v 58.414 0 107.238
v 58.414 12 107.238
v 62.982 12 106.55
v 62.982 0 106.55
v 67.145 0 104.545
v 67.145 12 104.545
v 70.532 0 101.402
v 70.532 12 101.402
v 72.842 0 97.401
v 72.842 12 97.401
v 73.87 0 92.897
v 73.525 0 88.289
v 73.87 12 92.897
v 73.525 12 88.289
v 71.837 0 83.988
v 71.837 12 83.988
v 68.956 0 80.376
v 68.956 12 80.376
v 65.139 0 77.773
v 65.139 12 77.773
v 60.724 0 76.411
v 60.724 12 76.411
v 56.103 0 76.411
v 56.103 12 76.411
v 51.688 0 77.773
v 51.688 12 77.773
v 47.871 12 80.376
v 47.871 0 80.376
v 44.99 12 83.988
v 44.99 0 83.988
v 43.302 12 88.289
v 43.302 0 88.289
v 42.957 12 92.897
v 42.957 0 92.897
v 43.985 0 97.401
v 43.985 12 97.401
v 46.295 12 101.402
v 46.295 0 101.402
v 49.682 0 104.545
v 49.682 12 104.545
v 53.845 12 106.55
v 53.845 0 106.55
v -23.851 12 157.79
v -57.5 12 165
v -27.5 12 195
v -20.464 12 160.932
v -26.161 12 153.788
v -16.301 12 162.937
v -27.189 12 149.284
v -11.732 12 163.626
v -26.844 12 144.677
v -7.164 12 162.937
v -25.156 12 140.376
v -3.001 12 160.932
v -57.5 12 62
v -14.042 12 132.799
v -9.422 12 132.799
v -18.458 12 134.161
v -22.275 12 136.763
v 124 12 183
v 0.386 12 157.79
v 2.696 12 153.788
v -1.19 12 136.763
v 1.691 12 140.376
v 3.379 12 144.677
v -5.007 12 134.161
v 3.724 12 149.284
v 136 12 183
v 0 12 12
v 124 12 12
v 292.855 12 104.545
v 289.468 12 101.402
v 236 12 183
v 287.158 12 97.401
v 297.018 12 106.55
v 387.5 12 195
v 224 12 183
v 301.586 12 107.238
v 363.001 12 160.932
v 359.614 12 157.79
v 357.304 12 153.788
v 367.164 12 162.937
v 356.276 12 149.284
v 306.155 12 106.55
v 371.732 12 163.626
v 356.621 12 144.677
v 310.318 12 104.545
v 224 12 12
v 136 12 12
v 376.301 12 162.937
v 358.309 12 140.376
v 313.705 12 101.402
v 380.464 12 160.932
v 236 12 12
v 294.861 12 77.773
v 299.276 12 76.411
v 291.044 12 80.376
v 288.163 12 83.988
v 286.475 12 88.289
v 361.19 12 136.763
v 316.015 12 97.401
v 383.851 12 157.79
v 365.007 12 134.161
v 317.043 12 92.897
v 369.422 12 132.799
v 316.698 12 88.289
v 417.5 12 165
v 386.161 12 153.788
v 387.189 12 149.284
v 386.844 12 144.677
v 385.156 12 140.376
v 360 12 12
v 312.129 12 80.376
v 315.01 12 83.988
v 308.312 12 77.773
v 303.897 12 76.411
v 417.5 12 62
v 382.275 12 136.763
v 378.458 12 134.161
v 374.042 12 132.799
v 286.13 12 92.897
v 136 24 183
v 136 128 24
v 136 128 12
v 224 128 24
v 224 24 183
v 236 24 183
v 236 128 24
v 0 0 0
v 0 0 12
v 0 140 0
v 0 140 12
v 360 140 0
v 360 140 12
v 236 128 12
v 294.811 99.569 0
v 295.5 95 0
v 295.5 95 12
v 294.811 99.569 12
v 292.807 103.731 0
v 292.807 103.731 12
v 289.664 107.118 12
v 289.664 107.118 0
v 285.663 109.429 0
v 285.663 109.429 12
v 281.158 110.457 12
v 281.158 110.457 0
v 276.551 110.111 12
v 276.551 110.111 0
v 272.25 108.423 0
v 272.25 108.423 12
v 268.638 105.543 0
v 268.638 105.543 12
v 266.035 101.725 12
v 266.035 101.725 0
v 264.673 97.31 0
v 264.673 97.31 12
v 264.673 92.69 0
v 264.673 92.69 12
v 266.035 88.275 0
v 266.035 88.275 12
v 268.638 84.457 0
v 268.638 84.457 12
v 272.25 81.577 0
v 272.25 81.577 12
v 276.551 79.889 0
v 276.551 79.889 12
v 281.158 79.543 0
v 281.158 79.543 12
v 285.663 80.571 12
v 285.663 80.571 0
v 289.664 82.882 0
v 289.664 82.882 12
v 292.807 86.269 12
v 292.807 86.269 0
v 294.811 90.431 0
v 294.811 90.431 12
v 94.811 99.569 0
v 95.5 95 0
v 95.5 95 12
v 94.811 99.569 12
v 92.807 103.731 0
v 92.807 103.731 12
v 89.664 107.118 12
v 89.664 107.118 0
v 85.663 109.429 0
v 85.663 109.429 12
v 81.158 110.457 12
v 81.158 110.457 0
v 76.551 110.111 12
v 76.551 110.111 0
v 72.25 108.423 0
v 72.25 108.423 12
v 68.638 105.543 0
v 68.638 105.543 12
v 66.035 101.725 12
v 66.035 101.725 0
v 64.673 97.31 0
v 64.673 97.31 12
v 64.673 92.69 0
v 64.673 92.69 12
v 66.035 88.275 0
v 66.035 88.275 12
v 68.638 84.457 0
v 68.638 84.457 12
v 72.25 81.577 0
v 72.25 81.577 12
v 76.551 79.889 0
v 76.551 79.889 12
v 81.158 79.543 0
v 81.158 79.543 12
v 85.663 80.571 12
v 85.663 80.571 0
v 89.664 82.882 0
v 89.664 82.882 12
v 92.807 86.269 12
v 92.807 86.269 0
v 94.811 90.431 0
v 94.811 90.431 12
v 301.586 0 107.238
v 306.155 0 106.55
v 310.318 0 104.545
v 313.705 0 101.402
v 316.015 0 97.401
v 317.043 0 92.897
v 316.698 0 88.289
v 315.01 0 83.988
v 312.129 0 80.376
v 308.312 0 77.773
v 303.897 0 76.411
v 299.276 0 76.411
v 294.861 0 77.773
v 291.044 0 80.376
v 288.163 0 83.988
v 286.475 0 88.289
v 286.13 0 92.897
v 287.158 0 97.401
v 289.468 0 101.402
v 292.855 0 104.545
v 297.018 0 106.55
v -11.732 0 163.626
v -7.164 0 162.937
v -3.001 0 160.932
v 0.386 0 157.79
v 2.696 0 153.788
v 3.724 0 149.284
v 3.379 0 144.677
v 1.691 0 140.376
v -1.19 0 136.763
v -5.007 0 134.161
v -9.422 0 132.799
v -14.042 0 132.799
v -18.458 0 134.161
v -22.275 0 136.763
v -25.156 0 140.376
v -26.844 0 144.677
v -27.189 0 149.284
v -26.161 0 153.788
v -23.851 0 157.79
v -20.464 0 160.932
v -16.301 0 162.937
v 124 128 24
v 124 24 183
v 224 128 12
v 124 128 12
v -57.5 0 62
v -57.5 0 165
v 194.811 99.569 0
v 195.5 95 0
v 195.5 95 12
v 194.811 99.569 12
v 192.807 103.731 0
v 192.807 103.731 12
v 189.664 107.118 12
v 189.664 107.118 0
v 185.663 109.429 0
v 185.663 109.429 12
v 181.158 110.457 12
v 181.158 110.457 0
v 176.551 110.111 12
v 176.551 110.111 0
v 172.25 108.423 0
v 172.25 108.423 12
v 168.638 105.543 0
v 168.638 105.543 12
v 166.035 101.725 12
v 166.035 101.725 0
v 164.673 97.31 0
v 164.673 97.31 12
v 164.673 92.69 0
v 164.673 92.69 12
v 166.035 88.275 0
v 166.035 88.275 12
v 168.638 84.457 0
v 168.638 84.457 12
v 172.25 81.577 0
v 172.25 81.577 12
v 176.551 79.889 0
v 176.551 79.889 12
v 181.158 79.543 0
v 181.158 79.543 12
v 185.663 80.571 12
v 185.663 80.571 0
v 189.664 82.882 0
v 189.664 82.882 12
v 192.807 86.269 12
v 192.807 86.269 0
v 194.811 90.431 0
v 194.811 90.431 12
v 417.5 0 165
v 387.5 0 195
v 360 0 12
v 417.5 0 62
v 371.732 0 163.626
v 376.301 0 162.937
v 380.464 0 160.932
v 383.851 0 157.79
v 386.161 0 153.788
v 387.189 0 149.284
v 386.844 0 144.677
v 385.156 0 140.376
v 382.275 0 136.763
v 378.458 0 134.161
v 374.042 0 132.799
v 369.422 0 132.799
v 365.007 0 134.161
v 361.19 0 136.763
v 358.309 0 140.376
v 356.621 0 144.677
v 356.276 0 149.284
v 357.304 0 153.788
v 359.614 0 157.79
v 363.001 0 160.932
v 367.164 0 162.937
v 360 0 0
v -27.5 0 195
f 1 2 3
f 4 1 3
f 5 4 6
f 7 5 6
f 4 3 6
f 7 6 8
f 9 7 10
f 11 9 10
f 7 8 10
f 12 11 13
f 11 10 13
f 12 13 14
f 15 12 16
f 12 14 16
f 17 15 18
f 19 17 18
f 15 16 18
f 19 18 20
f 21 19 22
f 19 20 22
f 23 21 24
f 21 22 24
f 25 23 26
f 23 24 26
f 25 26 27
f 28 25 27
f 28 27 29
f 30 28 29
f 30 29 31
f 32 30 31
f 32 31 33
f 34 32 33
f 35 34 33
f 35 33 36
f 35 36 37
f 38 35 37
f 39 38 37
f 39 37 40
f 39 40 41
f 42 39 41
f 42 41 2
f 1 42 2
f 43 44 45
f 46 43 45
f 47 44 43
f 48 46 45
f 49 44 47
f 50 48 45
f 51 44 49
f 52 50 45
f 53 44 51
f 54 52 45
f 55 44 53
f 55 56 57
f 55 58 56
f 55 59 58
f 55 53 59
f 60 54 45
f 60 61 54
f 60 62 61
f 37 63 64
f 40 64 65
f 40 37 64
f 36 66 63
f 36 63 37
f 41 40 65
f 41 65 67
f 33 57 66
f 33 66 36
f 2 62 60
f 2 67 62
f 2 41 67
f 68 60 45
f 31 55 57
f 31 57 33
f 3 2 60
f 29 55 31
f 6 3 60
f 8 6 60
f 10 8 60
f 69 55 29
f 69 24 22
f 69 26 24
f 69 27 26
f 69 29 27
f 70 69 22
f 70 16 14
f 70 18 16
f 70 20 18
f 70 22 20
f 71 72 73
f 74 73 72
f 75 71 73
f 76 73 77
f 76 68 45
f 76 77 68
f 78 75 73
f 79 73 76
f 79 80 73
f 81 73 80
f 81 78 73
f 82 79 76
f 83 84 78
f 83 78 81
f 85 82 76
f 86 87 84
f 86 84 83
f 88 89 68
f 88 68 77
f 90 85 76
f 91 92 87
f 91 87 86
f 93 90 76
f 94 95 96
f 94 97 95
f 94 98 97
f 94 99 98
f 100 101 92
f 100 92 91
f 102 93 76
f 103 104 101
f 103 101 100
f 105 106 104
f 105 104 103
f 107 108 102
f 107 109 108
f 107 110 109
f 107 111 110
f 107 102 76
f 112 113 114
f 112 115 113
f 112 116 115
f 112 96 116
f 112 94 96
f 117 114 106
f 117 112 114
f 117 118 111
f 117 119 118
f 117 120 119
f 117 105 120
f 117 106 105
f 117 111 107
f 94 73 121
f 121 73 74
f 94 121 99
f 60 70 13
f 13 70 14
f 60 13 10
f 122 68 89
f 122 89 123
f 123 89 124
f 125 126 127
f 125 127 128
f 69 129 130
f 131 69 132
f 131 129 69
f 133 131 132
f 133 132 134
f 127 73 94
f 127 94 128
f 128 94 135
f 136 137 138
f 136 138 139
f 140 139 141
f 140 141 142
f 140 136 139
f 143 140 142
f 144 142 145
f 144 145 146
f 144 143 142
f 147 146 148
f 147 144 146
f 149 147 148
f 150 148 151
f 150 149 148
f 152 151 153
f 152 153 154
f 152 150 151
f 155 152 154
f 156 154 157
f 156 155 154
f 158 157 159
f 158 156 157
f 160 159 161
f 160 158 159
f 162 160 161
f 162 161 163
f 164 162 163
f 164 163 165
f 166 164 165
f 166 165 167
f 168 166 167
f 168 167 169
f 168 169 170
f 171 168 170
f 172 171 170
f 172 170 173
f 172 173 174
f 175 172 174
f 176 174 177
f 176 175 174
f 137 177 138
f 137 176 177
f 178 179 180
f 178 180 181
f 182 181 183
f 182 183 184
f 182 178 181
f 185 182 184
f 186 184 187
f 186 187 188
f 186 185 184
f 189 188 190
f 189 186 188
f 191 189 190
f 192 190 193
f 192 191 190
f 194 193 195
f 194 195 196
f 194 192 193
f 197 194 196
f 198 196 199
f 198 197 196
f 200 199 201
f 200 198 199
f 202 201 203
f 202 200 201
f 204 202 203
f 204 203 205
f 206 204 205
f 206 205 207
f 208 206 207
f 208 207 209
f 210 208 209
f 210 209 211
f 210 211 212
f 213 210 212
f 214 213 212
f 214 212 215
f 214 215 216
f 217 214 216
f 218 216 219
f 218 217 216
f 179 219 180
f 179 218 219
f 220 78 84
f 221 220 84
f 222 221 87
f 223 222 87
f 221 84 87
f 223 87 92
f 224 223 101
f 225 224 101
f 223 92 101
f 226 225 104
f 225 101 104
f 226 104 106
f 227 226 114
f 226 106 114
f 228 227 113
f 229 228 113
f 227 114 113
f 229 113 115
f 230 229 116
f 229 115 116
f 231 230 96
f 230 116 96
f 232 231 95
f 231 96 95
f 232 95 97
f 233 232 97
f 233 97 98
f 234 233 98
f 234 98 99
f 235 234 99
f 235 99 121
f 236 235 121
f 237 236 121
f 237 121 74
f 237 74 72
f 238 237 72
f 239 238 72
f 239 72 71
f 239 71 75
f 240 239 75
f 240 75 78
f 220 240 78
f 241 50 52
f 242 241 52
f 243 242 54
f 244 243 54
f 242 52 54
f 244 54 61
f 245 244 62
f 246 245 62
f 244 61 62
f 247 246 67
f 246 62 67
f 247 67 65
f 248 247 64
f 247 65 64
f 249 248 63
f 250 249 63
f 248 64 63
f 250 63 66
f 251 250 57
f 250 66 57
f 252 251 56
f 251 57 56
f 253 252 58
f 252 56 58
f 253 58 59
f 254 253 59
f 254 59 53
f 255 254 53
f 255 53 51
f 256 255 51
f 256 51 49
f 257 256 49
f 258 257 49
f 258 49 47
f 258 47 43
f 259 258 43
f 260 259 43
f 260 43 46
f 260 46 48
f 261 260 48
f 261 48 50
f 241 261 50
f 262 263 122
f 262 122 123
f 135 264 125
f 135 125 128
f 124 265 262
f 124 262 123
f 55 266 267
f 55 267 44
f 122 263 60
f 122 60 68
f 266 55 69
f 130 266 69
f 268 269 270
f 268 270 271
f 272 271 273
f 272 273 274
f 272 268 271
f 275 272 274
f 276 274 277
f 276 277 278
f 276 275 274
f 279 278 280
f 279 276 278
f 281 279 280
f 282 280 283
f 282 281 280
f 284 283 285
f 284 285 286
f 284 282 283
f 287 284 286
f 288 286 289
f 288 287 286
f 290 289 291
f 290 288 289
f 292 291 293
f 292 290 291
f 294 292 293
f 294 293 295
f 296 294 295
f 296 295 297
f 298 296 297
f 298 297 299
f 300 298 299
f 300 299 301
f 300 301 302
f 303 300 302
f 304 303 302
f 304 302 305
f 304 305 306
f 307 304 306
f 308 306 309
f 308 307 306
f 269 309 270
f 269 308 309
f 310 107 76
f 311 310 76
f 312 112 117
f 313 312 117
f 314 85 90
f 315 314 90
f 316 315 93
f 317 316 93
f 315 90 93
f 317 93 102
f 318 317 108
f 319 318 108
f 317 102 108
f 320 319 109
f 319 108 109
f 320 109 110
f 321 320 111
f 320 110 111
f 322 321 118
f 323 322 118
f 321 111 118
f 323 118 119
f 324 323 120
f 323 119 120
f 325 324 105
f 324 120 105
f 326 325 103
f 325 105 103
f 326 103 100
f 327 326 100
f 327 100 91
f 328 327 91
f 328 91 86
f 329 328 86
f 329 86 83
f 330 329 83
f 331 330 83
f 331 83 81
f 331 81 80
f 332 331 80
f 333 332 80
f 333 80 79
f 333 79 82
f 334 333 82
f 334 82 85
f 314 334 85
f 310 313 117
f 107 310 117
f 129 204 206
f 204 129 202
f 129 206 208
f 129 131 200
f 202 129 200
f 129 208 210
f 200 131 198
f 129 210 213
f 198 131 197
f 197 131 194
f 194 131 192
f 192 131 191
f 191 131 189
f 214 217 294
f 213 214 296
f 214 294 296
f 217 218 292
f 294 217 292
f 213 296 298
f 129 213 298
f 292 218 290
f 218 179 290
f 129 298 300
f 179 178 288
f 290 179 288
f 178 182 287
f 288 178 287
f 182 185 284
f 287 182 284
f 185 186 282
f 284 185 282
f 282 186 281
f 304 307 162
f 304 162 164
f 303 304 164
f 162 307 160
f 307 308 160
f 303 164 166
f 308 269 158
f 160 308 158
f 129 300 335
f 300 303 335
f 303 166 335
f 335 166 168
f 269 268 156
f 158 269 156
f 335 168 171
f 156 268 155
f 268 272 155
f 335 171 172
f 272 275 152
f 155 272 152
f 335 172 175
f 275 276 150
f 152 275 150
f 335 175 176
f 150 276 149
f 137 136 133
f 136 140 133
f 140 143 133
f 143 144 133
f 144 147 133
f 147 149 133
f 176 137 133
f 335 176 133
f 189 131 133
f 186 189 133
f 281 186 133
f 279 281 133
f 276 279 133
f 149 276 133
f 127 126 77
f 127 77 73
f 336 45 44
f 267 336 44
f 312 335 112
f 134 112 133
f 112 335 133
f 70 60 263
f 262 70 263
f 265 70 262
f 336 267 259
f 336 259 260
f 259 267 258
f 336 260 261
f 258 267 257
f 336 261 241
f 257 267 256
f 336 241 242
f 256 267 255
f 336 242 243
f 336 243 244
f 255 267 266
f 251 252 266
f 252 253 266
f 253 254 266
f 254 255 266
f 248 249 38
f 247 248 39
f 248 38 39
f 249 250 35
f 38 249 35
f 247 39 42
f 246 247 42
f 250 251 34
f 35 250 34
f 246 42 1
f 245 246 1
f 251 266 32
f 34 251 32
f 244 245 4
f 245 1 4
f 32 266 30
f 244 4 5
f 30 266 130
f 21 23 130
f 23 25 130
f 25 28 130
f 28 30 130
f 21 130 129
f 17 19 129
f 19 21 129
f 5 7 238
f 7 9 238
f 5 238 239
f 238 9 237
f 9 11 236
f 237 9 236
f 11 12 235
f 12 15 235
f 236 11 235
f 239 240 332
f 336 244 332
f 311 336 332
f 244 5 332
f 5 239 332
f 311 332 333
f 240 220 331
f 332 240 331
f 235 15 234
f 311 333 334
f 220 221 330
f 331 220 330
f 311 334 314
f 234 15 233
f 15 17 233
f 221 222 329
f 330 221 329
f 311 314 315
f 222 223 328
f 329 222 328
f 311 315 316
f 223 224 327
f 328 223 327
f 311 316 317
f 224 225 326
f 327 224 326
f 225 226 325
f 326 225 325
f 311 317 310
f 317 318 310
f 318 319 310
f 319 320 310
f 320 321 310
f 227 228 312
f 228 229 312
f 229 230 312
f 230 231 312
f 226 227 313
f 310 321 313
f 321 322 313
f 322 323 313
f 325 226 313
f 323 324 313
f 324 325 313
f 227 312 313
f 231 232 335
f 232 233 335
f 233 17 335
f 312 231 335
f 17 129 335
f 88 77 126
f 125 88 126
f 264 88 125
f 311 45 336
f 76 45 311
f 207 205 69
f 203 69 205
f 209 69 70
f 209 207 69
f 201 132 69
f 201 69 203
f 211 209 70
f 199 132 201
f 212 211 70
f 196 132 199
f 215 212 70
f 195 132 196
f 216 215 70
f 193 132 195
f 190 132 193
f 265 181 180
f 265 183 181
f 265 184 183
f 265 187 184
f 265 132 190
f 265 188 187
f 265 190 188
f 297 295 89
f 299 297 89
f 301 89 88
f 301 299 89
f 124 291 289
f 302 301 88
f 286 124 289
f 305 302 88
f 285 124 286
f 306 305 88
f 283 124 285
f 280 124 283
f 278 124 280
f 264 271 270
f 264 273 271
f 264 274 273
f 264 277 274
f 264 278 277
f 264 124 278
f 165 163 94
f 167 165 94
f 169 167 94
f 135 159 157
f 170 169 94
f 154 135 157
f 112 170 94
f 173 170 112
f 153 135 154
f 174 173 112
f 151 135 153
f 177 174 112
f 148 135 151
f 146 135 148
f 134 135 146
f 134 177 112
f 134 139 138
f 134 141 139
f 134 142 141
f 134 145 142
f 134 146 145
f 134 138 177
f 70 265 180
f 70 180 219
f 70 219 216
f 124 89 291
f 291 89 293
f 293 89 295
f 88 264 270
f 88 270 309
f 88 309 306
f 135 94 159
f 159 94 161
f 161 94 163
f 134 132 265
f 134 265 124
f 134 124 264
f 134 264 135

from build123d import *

# Parameters (mm, degrees)
SKETCH1_W      = 360
SKETCH1_H      = 140
SKETCH1_R      = 15.5
EXTRUDE1_DEPTH = 12
SKETCH2_W      = 475
SKETCH2_H      = 12
EXTRUDE2_DEPTH = 183
SKETCH3_R      = 15.5
EXTRUDE3_DEPTH = 183
SKETCH4_W      = 12
SKETCH4_H      = 116
EXTRUDE4_DEPTH = 171
EXTRUDE5_DEPTH = 183


with BuildPart() as part:
    # Sketch1 → Extrude1 (new body)
    with BuildSketch(Plane.XY):
        with Locations((180, 70)):
            Rectangle(SKETCH1_W, SKETCH1_H)
        with Locations((80, 95)):
            Circle(SKETCH1_R, mode=Mode.SUBTRACT)
        with Locations((180, 95)):
            Circle(SKETCH1_R, mode=Mode.SUBTRACT)
        with Locations((280, 95)):
            Circle(SKETCH1_R, mode=Mode.SUBTRACT)
    extrude(amount=EXTRUDE1_DEPTH)

    # Sketch2 → Extrude2 (add)
    with BuildSketch(Plane.XY.offset(12)):
        with Locations((180, 6)):
            Rectangle(SKETCH2_W, SKETCH2_H)
    extrude(amount=EXTRUDE2_DEPTH)

    # Sketch3 → Extrude3 (cut)
    with BuildSketch(Plane(origin=(0, 12, 0), x_dir=(1, 0, 0), z_dir=(0, 1, 0))):
        Polygon((360, -12), (417.5, -62), (417.5, -12), align=None)
        Polygon((417.5, -165), (387.5, -195), (417.5, -195), align=None)
        Polygon((-57.5, -165), (-57.5, -195), (-27.5, -195), align=None)
        Polygon((-57.5, -12), (-57.5, -62), (0, -12), align=None)
        with Locations(Location((58.413652083, -91.738221798, 0), (0, 0, 270))):
            Circle(SKETCH3_R)
        with Locations(Location((-11.732317869, -148.125657451, 0), (0, 0, 270))):
            Circle(SKETCH3_R)
        with Locations(Location((301.586347917, -91.738221798, 0), (0, 0, 270))):
            Circle(SKETCH3_R)
        with Locations(Location((371.732317869, -148.125657451, 0), (0, 0, 270))):
            Circle(SKETCH3_R)
    extrude(amount=-EXTRUDE3_DEPTH, mode=Mode.SUBTRACT)

    # Sketch4 → Extrude4 (add)
    with BuildSketch(Plane.XY.offset(12)):
        with Locations((130, 70)):
            Rectangle(SKETCH4_W, SKETCH4_H)
        with Locations((230, 70)):
            Rectangle(SKETCH4_W, SKETCH4_H)
    extrude(amount=EXTRUDE4_DEPTH)

    # Sketch5 → Extrude5 (cut)
    with BuildSketch(Plane.ZY.offset(-124)):
        Polygon((183, 128), (183, 24), (24, 128), align=None)
    extrude(amount=-EXTRUDE5_DEPTH, mode=Mode.SUBTRACT)


solid = part.part
